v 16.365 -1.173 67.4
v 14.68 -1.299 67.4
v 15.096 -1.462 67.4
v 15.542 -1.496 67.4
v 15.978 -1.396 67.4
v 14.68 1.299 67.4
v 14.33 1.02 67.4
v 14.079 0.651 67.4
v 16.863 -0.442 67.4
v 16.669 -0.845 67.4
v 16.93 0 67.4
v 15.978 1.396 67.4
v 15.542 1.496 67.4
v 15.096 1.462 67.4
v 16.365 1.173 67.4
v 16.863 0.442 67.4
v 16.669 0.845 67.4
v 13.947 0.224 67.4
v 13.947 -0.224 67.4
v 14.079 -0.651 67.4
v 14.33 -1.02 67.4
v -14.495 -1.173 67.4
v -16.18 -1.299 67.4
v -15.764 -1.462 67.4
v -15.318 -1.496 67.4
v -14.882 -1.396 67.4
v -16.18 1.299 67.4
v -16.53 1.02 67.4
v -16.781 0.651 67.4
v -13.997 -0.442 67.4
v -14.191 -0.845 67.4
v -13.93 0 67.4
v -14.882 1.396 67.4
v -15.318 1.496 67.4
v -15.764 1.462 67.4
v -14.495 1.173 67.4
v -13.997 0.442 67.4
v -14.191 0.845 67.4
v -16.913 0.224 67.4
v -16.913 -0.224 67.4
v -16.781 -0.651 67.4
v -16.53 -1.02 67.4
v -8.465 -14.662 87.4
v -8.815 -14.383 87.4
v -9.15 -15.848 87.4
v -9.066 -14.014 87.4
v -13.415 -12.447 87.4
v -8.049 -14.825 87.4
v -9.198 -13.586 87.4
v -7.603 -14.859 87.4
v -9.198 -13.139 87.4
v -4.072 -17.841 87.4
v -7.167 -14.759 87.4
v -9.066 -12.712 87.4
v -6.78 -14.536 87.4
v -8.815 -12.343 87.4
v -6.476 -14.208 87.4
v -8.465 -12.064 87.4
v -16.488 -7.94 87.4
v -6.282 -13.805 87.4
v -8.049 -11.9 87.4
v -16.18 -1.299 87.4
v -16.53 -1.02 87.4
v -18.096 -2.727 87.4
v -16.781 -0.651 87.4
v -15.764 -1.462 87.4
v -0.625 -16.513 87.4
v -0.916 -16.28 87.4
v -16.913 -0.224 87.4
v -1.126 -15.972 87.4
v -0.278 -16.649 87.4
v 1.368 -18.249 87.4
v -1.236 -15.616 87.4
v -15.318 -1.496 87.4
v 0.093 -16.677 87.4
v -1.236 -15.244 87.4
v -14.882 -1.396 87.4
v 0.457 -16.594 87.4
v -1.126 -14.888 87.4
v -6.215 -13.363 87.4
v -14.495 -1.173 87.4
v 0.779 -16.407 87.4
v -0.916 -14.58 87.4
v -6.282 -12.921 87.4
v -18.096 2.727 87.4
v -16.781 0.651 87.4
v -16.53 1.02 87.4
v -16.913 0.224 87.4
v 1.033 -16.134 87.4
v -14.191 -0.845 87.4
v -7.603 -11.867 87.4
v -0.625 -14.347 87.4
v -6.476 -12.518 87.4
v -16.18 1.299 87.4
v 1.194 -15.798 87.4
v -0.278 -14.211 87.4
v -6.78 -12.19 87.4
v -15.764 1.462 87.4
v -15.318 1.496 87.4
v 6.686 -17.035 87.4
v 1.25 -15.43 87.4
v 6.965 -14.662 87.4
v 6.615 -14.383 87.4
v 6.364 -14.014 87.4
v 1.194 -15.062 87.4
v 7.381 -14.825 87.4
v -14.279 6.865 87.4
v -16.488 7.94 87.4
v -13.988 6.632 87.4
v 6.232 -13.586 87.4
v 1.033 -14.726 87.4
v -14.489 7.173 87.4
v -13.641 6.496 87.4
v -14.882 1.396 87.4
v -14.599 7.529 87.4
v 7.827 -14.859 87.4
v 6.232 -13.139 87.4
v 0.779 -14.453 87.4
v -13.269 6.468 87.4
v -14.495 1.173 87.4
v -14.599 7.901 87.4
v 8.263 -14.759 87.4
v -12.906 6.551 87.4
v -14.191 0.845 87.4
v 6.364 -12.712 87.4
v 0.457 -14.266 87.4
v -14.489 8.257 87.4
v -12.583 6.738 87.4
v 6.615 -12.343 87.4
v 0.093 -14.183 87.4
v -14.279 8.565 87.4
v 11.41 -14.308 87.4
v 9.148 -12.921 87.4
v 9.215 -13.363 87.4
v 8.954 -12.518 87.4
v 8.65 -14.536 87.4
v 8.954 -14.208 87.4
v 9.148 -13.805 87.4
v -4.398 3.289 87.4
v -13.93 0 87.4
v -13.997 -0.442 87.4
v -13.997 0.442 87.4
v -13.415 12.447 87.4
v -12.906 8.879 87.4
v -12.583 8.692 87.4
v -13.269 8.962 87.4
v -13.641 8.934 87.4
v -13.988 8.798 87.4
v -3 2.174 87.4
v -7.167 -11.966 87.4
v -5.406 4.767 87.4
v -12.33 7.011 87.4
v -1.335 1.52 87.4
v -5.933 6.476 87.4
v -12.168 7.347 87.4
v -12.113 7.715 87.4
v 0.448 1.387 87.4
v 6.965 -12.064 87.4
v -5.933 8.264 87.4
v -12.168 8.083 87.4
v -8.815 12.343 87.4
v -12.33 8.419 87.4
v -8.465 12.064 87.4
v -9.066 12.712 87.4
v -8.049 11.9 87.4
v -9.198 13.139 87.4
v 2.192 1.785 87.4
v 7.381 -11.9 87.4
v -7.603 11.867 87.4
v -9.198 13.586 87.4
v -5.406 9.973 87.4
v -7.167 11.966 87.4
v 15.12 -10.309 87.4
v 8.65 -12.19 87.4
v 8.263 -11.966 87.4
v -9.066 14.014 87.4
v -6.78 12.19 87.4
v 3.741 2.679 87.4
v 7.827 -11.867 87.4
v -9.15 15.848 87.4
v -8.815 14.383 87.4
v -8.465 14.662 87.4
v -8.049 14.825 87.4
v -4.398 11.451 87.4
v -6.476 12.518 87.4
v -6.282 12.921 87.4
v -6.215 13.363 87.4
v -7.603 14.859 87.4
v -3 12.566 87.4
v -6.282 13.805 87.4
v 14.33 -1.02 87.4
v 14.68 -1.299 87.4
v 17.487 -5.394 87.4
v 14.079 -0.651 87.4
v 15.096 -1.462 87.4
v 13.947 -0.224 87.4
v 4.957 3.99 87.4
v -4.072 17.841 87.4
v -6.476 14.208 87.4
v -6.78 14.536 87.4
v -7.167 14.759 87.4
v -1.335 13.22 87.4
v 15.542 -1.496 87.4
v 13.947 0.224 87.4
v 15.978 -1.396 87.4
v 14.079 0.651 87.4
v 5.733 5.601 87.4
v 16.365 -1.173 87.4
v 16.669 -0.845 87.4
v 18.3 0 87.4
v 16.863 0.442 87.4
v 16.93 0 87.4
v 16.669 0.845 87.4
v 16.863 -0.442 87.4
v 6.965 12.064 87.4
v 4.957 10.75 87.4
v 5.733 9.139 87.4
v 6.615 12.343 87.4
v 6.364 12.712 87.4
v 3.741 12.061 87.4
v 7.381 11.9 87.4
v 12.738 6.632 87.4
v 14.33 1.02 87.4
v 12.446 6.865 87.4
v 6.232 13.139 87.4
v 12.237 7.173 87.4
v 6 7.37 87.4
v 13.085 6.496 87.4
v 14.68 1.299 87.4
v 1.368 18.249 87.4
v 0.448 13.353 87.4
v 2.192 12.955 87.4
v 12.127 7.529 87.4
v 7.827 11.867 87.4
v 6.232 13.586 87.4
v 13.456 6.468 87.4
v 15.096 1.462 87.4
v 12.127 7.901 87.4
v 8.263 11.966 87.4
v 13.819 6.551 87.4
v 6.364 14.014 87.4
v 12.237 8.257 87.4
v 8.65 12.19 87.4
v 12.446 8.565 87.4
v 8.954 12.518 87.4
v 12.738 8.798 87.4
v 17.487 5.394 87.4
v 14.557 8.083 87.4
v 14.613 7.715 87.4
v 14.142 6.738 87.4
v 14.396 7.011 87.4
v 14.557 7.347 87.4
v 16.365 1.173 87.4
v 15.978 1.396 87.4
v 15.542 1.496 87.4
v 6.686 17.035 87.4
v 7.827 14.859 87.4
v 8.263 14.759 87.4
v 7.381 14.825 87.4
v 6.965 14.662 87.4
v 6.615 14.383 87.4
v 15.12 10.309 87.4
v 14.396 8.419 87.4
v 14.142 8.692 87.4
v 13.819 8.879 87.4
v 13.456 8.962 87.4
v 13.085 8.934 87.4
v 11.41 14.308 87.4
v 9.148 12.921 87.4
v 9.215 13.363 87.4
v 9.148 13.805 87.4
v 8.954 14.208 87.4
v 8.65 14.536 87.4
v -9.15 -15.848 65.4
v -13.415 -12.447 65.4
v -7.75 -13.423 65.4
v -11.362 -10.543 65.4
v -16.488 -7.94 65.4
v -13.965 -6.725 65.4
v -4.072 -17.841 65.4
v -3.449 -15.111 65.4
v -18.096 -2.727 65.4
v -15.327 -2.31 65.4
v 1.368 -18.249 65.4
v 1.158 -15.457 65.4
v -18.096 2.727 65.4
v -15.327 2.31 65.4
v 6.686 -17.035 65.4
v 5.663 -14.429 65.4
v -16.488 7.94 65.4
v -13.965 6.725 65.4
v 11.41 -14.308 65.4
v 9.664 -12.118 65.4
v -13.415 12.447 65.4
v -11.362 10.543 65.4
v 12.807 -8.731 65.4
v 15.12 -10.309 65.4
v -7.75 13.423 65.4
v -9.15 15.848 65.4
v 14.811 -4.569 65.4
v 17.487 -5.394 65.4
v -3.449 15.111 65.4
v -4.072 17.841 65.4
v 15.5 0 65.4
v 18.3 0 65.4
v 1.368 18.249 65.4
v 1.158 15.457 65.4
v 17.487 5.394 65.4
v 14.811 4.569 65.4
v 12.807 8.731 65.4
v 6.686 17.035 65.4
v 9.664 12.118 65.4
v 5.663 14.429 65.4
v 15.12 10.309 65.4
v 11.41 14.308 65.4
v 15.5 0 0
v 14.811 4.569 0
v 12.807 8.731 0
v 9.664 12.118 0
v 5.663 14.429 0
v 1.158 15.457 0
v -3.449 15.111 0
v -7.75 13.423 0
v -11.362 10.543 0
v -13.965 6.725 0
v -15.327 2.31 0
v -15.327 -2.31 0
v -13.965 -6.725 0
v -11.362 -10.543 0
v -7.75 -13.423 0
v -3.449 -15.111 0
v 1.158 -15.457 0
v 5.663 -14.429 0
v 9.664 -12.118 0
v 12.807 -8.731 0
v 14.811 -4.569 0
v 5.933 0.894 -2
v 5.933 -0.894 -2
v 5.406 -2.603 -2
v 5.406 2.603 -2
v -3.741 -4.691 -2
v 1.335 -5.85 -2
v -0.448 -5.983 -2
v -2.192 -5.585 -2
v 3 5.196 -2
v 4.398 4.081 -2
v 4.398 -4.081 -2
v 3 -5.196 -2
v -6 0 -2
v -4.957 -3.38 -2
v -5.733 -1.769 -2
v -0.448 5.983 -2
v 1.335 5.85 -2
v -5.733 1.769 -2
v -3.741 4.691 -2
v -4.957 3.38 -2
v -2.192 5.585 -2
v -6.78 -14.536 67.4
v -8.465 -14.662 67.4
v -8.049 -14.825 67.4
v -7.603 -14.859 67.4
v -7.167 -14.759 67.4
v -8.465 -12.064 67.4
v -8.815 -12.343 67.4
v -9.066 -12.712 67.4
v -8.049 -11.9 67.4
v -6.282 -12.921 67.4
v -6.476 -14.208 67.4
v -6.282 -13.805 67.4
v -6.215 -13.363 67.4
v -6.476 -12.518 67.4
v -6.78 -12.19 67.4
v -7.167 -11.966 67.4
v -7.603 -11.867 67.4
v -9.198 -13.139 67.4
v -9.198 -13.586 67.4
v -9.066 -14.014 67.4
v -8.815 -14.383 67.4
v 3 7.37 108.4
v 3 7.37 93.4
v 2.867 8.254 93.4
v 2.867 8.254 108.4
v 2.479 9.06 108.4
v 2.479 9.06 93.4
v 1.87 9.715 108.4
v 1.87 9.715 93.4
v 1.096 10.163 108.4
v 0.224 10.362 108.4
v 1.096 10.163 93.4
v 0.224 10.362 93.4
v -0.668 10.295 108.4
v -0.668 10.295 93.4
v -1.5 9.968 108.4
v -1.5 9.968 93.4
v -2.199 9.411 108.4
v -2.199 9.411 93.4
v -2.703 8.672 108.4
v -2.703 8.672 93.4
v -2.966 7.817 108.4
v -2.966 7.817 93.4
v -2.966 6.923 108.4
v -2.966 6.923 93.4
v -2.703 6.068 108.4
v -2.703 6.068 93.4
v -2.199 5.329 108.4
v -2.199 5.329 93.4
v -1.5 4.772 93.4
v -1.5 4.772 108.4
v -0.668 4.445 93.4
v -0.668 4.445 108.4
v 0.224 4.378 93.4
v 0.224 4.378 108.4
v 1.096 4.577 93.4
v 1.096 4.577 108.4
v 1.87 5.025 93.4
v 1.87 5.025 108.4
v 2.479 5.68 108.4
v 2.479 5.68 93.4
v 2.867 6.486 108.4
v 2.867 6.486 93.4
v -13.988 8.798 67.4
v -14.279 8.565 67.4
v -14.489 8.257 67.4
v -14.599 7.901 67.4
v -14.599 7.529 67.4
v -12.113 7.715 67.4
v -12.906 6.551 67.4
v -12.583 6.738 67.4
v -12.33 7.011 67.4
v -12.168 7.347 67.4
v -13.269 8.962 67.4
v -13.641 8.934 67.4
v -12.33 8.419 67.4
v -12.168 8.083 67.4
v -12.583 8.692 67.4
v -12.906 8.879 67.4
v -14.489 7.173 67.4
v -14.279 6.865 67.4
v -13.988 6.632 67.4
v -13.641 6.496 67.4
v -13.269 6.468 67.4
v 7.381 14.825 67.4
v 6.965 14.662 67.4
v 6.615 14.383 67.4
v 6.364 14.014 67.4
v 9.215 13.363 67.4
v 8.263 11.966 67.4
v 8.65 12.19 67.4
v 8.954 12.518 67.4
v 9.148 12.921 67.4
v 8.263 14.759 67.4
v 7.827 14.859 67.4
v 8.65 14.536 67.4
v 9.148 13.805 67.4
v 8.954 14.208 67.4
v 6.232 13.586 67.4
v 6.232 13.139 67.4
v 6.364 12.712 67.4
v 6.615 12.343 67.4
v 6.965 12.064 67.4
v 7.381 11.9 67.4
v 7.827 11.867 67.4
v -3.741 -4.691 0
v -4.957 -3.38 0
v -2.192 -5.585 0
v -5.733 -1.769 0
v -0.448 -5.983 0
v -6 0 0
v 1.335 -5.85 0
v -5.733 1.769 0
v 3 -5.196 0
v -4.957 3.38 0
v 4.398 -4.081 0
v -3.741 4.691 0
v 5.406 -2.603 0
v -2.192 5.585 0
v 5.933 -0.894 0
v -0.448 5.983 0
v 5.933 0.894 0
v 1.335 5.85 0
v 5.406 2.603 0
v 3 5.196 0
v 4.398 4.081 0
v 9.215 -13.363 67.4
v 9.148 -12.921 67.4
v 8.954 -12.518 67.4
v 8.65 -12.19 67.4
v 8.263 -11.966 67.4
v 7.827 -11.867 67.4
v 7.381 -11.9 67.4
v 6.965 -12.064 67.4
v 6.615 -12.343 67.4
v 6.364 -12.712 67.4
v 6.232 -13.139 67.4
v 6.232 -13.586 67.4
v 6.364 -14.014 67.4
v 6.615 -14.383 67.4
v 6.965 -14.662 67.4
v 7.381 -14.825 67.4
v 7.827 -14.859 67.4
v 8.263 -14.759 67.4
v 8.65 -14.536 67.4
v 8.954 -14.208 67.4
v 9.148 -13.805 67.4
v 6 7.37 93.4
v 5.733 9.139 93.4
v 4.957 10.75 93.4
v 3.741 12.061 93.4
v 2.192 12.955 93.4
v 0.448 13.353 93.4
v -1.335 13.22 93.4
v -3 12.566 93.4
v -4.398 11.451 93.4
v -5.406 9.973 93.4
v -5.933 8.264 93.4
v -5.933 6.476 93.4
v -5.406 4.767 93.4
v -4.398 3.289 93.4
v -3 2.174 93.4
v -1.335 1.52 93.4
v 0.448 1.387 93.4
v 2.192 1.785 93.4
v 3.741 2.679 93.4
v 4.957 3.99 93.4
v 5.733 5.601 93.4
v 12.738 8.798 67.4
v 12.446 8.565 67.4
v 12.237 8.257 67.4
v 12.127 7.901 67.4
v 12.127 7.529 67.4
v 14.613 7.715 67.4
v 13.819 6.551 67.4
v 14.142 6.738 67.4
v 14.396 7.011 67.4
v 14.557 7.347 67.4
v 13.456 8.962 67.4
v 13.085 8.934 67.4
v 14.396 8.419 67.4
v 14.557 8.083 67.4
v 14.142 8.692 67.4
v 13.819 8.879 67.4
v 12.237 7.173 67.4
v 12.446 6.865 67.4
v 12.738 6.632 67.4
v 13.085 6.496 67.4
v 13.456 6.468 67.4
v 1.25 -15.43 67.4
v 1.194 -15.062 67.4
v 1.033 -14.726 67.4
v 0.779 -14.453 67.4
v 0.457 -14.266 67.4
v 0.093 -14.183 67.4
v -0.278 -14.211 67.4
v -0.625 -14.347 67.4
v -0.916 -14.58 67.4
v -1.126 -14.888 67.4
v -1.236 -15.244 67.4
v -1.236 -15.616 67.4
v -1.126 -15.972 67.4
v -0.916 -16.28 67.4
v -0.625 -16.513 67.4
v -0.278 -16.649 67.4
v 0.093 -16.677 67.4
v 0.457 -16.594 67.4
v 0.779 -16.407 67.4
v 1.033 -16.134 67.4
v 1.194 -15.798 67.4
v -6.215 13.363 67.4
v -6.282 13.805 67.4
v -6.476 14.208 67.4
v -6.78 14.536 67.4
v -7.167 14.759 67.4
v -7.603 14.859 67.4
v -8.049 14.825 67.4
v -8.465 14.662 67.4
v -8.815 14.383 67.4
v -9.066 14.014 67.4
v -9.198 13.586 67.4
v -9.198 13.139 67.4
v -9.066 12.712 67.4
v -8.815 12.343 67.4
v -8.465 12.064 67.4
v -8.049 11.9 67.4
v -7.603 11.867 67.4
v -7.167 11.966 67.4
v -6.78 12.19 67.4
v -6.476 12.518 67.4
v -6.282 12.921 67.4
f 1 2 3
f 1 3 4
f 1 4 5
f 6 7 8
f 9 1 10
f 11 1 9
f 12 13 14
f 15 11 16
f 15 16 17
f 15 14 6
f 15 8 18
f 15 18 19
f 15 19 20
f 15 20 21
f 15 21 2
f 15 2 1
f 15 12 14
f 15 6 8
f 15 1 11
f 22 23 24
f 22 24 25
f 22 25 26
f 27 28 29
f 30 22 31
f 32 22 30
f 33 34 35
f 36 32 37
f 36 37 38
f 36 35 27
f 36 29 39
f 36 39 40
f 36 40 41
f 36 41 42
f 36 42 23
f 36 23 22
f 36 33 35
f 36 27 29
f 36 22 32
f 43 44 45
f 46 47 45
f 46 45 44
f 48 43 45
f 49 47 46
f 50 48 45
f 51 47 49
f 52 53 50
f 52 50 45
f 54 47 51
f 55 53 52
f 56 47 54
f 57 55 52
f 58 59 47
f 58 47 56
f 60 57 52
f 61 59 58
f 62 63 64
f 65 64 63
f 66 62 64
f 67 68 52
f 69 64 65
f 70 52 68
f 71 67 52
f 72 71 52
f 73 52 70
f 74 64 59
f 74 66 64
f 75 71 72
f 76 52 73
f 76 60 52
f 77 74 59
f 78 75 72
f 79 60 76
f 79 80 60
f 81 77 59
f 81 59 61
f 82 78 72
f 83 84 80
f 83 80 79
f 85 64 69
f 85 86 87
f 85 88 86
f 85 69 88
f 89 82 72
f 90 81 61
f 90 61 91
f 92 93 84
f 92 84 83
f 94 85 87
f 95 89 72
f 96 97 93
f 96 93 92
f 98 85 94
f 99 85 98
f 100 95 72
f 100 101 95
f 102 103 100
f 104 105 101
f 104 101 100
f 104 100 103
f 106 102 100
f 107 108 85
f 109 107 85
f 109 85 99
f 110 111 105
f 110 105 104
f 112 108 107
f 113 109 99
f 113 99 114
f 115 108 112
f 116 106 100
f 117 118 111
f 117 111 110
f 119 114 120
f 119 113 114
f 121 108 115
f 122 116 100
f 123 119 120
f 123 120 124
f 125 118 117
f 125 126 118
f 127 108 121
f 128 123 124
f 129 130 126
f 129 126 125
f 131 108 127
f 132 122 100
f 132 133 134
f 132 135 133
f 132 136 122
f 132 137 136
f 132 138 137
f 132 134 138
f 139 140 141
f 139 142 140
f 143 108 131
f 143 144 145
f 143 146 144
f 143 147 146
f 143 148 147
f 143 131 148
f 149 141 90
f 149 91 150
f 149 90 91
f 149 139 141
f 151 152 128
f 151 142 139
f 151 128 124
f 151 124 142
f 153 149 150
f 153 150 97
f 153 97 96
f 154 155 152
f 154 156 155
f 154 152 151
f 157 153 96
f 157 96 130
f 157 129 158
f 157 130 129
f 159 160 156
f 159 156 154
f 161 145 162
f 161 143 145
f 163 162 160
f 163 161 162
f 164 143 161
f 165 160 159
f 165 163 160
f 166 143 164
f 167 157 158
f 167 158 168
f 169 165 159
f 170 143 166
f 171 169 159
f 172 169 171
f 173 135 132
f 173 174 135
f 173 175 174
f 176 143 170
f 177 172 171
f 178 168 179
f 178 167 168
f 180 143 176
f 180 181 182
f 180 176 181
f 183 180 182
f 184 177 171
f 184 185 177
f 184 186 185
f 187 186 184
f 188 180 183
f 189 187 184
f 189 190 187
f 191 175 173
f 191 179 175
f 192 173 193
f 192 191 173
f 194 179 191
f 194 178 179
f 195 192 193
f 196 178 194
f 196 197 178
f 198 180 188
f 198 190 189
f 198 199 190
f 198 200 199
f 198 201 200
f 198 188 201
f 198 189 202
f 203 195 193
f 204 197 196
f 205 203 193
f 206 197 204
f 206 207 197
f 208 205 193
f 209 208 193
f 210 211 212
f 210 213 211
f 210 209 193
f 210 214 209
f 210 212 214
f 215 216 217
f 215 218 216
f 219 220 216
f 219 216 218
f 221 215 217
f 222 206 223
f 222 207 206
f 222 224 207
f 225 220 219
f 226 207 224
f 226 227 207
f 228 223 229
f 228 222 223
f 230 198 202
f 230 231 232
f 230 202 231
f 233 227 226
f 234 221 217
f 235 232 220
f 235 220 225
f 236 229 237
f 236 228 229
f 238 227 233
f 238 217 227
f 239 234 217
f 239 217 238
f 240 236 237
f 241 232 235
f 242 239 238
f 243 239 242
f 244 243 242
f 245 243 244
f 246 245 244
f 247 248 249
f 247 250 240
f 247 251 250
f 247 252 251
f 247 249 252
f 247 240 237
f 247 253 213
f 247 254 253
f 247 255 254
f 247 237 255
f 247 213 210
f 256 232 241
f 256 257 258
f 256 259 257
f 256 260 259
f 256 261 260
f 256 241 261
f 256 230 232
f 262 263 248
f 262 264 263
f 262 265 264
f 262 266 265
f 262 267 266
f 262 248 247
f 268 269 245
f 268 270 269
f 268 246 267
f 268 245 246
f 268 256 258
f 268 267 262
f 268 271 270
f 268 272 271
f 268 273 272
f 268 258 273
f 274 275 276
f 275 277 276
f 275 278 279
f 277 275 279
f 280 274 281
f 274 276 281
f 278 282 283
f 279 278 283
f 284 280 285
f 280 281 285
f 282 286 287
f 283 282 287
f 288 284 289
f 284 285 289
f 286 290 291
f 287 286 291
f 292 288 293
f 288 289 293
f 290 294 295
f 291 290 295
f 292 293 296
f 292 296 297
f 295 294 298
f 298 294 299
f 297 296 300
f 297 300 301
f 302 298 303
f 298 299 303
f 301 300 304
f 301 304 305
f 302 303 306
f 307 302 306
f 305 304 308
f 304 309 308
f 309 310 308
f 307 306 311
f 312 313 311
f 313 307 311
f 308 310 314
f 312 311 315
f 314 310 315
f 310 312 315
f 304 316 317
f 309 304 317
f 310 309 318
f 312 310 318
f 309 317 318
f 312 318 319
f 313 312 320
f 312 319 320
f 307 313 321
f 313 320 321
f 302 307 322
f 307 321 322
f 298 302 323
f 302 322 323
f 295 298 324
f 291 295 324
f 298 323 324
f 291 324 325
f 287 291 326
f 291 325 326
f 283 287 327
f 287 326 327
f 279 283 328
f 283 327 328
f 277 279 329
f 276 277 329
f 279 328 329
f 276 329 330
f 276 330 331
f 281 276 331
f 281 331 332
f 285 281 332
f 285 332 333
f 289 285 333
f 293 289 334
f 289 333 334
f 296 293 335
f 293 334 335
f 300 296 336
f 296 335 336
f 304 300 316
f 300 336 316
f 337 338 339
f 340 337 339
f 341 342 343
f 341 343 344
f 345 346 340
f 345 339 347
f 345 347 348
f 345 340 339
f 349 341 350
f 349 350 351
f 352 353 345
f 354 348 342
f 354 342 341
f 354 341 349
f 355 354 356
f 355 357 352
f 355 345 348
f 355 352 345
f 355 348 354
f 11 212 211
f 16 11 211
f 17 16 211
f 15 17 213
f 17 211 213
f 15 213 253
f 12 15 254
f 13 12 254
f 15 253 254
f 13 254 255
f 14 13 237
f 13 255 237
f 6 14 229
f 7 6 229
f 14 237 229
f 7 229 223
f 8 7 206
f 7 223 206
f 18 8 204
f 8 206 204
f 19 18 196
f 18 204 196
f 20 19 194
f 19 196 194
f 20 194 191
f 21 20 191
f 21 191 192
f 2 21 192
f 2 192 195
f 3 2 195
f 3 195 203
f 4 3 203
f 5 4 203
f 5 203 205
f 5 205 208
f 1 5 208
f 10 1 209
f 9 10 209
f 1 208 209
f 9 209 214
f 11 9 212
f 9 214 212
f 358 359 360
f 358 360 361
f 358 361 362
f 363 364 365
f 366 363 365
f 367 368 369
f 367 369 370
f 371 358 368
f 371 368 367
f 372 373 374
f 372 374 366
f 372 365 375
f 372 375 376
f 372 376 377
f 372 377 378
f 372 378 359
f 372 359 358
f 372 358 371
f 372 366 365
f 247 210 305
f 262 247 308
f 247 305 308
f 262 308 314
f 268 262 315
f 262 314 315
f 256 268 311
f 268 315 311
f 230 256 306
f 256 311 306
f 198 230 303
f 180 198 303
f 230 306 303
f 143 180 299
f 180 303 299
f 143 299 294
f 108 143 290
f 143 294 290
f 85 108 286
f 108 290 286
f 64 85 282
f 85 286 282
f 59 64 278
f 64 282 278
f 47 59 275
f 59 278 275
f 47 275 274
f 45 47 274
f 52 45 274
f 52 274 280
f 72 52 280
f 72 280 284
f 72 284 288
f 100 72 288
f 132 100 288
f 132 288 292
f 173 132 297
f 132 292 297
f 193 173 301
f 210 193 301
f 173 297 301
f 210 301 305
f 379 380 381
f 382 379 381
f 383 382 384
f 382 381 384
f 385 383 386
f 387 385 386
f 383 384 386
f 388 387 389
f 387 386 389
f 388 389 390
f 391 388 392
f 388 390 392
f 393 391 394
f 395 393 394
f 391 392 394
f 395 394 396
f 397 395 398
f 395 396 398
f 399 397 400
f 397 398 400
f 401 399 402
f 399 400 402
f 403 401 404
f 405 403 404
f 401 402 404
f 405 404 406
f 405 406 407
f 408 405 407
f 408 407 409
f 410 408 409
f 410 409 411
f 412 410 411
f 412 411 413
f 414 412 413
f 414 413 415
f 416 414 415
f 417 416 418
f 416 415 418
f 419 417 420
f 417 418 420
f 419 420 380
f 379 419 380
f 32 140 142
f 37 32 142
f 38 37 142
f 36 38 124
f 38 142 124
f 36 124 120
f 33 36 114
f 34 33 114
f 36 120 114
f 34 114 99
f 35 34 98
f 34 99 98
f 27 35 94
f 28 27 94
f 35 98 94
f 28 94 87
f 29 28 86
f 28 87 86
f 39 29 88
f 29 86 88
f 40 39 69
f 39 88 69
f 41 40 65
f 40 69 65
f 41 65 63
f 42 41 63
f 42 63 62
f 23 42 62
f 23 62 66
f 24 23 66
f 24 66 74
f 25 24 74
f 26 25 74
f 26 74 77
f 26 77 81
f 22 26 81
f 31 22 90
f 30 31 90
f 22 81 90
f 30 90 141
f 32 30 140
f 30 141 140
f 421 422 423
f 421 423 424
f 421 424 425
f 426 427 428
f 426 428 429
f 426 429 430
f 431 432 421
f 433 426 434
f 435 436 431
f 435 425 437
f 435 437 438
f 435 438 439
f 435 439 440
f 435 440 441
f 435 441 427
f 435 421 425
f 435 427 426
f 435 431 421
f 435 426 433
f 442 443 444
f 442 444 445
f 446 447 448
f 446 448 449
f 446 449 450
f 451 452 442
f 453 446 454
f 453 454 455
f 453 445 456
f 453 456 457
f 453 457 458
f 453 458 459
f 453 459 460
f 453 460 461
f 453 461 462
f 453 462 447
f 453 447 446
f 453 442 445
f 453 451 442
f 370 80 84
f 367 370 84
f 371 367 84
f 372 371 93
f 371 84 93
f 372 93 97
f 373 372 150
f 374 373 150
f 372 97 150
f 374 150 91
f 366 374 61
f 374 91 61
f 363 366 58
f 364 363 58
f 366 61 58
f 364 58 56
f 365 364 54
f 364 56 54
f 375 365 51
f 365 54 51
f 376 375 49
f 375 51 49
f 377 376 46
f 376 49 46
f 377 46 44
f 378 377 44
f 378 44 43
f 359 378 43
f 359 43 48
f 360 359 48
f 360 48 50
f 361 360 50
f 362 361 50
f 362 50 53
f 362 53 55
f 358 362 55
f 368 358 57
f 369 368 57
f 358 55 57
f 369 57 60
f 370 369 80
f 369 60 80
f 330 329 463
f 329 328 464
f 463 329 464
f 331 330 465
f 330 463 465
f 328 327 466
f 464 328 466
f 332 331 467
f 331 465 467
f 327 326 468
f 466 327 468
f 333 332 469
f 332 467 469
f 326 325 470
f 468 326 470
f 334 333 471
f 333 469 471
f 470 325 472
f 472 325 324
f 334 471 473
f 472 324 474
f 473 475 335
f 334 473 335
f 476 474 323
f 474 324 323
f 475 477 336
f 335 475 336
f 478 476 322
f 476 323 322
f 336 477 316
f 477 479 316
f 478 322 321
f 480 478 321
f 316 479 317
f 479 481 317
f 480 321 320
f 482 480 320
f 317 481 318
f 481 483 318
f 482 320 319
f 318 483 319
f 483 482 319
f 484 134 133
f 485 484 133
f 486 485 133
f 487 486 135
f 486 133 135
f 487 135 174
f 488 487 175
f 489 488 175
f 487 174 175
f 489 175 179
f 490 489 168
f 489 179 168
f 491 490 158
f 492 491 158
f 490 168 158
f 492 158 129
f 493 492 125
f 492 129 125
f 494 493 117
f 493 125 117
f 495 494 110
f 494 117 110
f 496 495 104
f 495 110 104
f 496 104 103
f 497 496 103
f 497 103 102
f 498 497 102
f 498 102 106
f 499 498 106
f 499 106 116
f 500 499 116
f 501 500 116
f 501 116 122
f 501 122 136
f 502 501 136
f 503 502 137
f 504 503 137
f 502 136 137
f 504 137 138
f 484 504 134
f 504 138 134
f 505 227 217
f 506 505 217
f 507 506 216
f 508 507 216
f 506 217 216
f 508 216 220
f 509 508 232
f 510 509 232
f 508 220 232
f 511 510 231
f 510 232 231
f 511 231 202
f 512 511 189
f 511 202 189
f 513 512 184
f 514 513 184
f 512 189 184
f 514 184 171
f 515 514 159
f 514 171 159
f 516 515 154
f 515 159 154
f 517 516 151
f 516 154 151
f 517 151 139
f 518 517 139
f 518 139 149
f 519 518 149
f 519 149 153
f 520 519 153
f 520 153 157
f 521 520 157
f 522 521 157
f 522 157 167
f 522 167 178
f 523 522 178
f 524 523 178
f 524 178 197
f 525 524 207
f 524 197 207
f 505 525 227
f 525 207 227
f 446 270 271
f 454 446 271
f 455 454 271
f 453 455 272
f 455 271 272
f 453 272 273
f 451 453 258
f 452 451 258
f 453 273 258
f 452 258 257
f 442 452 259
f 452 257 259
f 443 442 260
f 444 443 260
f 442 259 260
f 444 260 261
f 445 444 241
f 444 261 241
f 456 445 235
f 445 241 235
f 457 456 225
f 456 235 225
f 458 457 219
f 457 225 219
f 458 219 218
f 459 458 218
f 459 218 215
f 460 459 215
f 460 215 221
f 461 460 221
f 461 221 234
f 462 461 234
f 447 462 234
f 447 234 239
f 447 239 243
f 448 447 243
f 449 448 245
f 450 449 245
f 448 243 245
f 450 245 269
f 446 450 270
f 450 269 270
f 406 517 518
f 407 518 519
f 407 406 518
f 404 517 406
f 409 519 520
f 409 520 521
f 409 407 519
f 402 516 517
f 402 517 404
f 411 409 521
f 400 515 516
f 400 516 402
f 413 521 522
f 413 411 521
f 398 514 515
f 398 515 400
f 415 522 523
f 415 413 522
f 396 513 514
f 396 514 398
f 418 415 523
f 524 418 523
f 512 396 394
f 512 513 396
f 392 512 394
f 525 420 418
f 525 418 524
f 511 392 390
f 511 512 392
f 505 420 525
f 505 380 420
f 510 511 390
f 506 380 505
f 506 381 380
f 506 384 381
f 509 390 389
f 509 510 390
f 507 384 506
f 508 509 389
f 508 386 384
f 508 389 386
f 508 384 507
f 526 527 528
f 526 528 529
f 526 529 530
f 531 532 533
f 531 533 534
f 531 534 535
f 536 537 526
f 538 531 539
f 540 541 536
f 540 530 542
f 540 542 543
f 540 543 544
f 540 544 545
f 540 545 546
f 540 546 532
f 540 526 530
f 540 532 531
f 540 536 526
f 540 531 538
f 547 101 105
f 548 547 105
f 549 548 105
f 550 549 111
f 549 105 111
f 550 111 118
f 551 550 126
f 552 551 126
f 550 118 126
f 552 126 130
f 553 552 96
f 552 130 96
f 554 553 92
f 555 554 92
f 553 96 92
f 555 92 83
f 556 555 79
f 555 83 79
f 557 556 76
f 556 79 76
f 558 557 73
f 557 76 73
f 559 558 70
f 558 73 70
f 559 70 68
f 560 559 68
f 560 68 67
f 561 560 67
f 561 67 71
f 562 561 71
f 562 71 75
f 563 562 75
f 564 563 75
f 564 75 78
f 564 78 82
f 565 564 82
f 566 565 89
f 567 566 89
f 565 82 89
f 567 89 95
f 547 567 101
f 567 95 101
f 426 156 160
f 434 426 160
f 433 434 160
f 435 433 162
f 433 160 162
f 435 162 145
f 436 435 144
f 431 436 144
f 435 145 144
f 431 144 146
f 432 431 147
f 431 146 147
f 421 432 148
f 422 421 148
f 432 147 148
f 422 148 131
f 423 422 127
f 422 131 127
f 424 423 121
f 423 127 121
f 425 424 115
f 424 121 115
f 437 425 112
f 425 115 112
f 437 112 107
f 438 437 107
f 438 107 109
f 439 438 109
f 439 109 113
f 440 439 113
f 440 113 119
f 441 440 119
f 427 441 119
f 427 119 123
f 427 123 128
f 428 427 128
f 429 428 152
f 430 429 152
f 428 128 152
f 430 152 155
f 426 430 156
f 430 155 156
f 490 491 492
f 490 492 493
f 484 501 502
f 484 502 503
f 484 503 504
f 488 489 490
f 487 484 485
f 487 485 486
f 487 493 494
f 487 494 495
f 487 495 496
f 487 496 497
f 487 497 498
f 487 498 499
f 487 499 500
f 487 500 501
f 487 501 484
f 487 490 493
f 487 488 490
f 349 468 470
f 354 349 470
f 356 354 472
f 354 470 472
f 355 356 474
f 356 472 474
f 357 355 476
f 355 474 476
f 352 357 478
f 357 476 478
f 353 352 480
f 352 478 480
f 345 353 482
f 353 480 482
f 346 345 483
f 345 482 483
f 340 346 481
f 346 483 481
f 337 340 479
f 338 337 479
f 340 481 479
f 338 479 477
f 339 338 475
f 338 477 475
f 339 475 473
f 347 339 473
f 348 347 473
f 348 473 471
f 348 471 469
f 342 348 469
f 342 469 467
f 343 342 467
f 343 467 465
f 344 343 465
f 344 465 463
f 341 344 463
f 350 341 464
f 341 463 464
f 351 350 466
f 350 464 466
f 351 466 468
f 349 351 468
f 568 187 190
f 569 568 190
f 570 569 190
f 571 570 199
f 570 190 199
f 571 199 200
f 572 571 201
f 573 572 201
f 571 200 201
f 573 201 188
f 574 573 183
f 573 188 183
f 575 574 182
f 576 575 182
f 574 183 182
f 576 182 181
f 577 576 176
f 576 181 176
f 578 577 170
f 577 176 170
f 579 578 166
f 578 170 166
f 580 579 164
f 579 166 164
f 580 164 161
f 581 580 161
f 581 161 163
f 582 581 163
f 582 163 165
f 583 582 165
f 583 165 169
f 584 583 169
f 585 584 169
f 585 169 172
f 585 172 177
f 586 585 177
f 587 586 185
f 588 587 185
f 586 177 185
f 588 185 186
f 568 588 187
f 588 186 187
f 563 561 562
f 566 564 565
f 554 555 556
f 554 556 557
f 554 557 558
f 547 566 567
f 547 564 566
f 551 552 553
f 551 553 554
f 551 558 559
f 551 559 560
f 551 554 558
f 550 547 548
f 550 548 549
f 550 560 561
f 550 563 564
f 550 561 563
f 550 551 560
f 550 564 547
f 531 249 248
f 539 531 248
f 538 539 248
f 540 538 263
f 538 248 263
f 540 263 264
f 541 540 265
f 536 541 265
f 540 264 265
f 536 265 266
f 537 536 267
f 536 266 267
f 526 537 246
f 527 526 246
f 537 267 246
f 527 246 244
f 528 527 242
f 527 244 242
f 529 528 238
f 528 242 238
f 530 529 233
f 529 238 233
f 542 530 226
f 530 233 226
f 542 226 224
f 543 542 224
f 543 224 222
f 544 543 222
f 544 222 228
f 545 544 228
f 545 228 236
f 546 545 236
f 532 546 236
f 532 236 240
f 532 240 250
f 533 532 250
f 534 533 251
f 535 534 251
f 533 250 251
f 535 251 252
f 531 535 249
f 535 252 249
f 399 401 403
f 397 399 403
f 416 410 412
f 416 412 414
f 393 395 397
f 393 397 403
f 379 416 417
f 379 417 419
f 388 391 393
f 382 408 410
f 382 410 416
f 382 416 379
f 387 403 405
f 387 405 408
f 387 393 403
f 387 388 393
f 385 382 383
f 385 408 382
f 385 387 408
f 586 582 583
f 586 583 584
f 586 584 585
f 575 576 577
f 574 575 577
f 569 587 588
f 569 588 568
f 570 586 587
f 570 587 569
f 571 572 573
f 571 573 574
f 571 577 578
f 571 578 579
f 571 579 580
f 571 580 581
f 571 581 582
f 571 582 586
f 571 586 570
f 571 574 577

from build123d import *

# Parameters (mm, degrees)
CROQUIS1_R              = 15.5
SALIENTE_EXTRUIR1_DEPTH = 65.4
CROQUIS2_R              = 6
SALIENTE_EXTRUIR2_DEPTH = 2
CROQUIS3_R              = 18.3
SALIENTE_EXTRUIR3_DEPTH = 22
CROQUIS4_R              = 1.5
CORTAR_EXTRUIR1_DEPTH   = 20
CROQUIS5_R              = 1.25
CORTAR_EXTRUIR2_DEPTH   = 20
CROQUIS6_R              = 6
SALIENTE_EXTRUIR4_DEPTH = 6
CROQUIS7_R              = 3
SALIENTE_EXTRUIR5_DEPTH = 15


with BuildPart() as part:
    # Croquis1 → Saliente-Extruir1 (new body)
    with BuildSketch(Plane.XY):
        Circle(CROQUIS1_R)
    extrude(amount=SALIENTE_EXTRUIR1_DEPTH)

    # Croquis2 → Saliente-Extruir2 (add)
    with BuildSketch(Plane(origin=(0, 0, 0), x_dir=(-1, 0, 0), z_dir=(0, 0, -1))):
        Circle(CROQUIS2_R)
    extrude(amount=SALIENTE_EXTRUIR2_DEPTH)

    # Croquis3 → Saliente-Extruir3 (add)
    with BuildSketch(Plane.XY.offset(65.4)):
        Circle(CROQUIS3_R)
    extrude(amount=SALIENTE_EXTRUIR3_DEPTH)

    # Croquis4 → Cortar-Extruir1 (cut)
    with BuildSketch(Plane.XY.offset(87.4)):
        with Locations((-15.43, 0)):
            Circle(CROQUIS4_R)
        with Locations((-7.715, 13.36277198)):
            Circle(CROQUIS4_R)
        with Locations((7.715, 13.36277198)):
            Circle(CROQUIS4_R)
        with Locations((15.43, 0)):
            Circle(CROQUIS4_R)
        with Locations((-7.715, -13.36277198)):
            Circle(CROQUIS4_R)
        with Locations((7.715, -13.36277198)):
            Circle(CROQUIS4_R)
    extrude(amount=-CORTAR_EXTRUIR1_DEPTH, mode=Mode.SUBTRACT)

    # Croquis5 → Cortar-Extruir2 (cut)
    with BuildSketch(Plane.XY.offset(87.4)):
        with Locations((0, -15.43)):
            Circle(CROQUIS5_R)
        with Locations((-13.36277198, 7.715)):
            Circle(CROQUIS5_R)
        with Locations((13.36277198, 7.715)):
            Circle(CROQUIS5_R)
    extrude(amount=-CORTAR_EXTRUIR2_DEPTH, mode=Mode.SUBTRACT)

    # Croquis6 → Saliente-Extruir4 (add)
    with BuildSketch(Plane.XY.offset(87.4)):
        with Locations((0, 7.37)):
            Circle(CROQUIS6_R)
    extrude(amount=SALIENTE_EXTRUIR4_DEPTH)

    # Croquis7 → Saliente-Extruir5 (add)
    with BuildSketch(Plane.XY.offset(93.4)):
        with Locations((0, 7.37)):
            Circle(CROQUIS7_R)
    extrude(amount=SALIENTE_EXTRUIR5_DEPTH)


solid = part.part
